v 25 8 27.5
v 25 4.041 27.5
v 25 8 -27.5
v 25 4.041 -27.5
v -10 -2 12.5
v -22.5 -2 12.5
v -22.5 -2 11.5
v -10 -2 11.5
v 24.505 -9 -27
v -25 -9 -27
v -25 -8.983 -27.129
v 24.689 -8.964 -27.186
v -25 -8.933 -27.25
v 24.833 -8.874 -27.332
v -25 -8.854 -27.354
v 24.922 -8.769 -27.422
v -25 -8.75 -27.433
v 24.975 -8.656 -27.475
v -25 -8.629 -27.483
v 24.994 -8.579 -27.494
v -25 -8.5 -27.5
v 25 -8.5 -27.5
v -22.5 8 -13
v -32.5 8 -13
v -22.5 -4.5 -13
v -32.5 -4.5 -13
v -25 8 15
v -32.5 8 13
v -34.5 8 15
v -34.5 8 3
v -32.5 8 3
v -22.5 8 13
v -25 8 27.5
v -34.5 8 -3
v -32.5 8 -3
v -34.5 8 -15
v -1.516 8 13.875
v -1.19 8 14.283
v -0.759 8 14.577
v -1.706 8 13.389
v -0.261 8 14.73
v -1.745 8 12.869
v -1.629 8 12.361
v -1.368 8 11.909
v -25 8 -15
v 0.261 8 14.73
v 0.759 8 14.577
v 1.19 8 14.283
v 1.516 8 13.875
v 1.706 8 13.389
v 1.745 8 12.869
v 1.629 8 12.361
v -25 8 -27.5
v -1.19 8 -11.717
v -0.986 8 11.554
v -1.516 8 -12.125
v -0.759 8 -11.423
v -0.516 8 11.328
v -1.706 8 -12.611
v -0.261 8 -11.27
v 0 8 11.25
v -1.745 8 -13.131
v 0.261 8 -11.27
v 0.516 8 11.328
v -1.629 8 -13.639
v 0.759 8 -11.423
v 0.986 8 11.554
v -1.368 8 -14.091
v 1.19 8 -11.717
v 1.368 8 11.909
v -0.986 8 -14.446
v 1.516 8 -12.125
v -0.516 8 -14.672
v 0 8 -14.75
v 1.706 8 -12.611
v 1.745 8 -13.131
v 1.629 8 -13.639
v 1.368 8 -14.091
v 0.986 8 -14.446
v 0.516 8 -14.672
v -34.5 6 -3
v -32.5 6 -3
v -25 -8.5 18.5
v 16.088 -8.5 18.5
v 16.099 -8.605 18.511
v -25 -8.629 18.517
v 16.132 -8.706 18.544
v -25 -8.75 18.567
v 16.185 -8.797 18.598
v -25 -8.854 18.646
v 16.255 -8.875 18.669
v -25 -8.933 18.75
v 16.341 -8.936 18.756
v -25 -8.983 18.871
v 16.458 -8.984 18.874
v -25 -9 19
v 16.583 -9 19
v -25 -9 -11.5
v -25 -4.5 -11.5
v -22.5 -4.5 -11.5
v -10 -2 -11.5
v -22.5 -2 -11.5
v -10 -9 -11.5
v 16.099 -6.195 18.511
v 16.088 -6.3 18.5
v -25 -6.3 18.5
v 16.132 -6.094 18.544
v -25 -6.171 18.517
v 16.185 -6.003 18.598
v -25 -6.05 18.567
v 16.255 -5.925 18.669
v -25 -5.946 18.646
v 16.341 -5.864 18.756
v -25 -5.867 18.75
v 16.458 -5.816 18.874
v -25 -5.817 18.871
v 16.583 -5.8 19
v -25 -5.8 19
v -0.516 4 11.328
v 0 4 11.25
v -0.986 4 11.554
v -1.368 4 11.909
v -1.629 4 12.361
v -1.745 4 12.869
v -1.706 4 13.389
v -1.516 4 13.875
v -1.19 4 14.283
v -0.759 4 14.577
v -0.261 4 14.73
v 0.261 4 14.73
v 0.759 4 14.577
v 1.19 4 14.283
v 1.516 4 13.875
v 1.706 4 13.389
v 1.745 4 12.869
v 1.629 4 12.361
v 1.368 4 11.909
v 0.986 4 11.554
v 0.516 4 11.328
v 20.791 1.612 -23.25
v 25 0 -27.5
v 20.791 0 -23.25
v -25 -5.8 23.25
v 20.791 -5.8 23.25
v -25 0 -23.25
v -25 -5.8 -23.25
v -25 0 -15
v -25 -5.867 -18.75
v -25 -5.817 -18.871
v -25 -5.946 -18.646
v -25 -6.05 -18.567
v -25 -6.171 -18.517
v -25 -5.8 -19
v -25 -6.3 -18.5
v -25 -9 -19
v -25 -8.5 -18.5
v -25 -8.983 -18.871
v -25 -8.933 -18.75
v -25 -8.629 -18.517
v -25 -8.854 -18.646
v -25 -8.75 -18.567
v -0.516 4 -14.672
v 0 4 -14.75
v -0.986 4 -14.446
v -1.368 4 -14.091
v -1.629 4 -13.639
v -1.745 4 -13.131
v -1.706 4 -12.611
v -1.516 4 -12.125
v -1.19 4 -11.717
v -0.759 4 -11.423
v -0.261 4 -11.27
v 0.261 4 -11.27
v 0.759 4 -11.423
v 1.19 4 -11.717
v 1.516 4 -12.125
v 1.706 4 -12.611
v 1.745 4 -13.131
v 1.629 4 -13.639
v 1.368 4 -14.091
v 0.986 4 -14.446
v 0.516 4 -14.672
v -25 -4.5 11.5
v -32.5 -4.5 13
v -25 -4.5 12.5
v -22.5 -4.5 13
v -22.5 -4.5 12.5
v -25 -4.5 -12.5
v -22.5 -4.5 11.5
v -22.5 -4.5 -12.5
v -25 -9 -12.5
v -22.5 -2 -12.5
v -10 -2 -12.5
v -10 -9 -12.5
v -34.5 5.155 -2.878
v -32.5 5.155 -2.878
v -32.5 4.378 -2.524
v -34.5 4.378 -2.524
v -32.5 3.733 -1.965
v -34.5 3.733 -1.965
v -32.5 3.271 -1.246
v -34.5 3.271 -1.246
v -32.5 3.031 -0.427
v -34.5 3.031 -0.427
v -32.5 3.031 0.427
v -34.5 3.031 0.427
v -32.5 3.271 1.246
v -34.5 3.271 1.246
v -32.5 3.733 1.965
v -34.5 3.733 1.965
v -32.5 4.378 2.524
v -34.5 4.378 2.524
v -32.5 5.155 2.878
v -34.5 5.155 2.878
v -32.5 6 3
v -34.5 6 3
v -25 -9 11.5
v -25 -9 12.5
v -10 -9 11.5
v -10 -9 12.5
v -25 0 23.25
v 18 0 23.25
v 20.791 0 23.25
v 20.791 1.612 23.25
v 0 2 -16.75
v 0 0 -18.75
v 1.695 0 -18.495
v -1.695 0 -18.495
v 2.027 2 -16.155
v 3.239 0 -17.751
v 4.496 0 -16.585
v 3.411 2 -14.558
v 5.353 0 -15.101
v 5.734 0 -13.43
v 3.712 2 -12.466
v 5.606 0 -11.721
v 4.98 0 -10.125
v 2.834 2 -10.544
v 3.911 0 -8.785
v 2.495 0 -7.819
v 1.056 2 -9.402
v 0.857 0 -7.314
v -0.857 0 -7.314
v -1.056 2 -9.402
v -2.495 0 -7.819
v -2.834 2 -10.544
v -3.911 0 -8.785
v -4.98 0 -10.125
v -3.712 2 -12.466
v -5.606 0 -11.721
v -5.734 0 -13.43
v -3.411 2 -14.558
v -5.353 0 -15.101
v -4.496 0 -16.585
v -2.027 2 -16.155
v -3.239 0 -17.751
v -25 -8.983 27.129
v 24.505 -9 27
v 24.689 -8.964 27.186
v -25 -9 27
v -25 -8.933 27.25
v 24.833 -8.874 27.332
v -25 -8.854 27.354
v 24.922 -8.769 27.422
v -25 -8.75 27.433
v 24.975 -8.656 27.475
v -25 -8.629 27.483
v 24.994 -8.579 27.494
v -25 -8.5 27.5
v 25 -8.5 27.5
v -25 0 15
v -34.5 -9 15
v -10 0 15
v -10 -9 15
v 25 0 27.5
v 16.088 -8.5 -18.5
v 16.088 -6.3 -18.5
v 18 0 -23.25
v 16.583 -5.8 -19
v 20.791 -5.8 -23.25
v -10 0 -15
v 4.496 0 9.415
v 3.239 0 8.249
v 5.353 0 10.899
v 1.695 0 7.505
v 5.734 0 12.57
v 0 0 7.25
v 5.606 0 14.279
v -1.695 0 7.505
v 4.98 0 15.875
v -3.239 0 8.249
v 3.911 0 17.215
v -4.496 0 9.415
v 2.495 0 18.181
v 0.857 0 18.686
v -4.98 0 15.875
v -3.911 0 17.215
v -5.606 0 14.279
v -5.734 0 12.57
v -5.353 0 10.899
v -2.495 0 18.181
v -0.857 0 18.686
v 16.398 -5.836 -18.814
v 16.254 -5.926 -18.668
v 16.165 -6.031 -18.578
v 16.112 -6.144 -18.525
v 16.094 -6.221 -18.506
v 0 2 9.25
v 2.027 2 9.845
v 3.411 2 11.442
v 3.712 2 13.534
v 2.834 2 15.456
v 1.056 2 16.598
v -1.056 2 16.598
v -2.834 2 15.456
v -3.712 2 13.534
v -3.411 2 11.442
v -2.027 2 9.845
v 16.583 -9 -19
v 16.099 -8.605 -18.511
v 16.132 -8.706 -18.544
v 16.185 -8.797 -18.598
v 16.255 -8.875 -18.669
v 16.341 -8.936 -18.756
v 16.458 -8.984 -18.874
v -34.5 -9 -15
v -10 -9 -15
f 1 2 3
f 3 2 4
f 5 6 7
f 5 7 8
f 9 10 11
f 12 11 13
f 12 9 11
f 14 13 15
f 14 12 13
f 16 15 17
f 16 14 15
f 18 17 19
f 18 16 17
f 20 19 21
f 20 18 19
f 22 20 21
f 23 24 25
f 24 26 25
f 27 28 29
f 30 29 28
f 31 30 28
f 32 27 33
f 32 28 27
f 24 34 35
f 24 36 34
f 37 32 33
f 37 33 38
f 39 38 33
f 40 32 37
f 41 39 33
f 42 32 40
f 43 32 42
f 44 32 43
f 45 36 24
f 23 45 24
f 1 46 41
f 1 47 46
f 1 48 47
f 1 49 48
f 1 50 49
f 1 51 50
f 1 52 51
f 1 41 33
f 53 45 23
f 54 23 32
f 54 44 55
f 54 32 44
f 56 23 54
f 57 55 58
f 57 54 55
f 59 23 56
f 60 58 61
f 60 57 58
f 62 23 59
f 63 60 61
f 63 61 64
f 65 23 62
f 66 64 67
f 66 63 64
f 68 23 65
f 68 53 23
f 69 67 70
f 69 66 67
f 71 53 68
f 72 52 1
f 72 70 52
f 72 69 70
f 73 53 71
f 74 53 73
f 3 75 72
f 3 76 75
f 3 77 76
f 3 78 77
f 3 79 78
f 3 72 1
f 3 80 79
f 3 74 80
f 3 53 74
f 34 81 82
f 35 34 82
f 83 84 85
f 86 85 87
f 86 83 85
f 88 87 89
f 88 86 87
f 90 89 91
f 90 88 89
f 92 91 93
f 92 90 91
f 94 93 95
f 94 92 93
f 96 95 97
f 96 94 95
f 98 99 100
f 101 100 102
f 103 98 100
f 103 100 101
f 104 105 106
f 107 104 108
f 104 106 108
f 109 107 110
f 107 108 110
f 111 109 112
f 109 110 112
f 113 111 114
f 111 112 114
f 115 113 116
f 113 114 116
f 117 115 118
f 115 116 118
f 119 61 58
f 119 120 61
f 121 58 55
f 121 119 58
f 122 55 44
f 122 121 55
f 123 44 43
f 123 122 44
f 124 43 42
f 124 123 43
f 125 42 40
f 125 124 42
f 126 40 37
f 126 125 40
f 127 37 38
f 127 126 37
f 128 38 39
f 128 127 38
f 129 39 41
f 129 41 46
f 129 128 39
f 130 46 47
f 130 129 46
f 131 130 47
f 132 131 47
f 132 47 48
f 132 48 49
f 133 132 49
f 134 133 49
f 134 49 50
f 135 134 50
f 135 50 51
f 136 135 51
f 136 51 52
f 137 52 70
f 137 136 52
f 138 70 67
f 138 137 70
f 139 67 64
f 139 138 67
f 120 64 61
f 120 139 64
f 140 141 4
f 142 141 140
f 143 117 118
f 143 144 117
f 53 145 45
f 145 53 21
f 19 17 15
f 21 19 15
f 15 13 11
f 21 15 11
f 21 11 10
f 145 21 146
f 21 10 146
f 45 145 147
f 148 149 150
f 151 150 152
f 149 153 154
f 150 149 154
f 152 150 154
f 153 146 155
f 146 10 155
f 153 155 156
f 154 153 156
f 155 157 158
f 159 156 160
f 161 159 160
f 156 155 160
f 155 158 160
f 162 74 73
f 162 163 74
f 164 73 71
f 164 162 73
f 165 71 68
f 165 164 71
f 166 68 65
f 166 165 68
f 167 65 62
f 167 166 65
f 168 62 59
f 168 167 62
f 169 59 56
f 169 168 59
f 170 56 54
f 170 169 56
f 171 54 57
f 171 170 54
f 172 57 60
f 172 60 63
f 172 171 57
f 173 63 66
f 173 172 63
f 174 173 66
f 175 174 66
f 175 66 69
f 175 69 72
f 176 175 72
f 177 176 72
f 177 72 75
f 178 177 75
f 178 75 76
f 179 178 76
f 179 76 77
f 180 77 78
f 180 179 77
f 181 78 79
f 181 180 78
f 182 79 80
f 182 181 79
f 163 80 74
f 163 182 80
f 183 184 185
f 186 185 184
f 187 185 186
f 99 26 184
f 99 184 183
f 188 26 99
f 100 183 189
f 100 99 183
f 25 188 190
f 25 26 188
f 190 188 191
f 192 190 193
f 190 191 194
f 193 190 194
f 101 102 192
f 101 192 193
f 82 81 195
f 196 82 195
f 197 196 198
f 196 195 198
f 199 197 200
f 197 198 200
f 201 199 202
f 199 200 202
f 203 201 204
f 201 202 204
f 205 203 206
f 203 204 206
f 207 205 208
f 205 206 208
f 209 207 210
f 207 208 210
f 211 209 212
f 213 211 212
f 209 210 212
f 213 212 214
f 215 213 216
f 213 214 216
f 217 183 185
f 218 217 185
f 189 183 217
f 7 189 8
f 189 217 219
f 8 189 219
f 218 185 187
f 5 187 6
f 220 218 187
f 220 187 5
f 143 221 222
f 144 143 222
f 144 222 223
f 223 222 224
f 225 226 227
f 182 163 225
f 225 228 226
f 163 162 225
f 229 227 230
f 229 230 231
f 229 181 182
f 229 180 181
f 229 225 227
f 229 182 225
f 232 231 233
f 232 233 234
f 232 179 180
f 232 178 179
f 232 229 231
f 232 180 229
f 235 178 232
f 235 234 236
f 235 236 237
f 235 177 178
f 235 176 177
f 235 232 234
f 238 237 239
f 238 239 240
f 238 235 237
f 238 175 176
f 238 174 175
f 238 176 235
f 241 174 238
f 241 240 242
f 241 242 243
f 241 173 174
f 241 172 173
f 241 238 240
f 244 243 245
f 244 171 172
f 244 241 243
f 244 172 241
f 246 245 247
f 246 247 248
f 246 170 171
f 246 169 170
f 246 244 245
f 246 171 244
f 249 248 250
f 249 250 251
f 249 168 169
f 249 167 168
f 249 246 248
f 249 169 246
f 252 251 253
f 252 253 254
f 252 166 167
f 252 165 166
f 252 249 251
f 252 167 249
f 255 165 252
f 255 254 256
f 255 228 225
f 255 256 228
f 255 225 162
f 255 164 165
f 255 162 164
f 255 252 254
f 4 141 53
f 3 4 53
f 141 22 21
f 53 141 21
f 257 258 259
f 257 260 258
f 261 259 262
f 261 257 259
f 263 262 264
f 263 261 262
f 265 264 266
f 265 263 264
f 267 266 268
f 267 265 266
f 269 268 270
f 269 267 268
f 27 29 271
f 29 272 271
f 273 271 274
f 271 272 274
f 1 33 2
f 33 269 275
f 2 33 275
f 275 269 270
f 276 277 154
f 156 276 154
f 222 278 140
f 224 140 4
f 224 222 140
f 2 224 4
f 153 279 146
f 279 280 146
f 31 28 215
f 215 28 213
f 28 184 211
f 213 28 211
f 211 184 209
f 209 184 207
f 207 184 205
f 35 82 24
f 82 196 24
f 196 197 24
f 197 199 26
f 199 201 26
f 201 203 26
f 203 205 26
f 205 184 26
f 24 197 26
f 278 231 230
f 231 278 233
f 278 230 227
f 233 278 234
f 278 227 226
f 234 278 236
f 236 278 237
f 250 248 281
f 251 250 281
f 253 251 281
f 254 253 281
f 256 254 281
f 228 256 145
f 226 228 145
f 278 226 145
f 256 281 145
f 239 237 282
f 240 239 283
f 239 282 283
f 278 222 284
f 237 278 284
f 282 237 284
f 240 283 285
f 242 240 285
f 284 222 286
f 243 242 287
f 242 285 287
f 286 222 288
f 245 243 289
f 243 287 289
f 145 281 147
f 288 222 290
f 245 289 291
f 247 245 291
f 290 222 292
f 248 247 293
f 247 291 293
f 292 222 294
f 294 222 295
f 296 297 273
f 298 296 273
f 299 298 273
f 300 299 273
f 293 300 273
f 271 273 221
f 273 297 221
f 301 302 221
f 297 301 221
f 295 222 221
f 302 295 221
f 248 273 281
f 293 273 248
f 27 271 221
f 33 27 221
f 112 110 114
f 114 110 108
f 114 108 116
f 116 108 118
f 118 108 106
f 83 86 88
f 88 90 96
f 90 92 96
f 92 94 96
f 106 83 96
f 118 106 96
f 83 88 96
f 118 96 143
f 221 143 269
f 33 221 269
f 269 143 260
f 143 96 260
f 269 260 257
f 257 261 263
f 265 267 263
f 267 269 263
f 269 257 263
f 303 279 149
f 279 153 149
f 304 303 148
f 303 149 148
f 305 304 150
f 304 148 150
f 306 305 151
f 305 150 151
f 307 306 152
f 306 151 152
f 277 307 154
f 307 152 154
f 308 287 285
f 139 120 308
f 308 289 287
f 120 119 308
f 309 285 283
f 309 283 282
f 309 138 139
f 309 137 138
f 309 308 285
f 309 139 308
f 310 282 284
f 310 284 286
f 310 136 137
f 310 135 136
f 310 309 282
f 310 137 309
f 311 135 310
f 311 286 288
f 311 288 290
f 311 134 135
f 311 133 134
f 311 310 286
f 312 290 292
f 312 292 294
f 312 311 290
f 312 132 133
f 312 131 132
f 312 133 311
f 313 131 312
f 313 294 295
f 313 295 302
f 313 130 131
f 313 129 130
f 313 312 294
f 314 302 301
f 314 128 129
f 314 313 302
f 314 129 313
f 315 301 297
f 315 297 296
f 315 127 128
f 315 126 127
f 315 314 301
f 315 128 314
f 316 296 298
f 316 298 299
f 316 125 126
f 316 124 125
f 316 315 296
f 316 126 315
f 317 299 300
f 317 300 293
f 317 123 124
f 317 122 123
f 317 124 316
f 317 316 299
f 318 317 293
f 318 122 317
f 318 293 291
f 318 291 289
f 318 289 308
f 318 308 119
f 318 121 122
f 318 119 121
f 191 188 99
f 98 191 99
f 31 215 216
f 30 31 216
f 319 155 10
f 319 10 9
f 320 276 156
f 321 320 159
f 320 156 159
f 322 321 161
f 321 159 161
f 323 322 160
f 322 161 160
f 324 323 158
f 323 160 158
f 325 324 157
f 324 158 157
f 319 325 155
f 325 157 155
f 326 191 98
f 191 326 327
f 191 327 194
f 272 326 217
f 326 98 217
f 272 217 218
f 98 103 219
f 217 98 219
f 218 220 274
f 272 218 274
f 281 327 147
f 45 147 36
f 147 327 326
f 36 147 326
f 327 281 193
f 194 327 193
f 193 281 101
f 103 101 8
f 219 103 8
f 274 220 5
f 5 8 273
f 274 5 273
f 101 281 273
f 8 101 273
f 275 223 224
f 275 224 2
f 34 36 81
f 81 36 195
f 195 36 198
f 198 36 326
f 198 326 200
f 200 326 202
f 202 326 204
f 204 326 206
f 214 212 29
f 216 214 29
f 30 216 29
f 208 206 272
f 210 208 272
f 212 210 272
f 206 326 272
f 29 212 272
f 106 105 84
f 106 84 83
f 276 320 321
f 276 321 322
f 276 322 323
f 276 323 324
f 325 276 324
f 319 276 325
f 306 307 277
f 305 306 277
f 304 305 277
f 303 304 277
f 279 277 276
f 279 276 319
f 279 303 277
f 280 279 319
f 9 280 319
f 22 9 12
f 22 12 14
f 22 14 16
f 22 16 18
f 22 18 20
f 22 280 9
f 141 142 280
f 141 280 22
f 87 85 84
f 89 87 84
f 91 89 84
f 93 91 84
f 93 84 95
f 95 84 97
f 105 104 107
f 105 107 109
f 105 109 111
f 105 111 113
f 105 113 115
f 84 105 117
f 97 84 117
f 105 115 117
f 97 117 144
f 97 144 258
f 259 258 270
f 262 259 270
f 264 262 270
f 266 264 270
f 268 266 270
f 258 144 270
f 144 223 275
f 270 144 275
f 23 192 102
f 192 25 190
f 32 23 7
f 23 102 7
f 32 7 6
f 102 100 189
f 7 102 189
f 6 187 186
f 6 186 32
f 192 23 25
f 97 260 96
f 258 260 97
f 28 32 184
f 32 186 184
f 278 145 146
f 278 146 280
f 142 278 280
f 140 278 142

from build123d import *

# Parameters (mm, degrees)
SKETCH_1_W          = 50
SKETCH_1_H          = 55
EXTRUDE_1_DEPTH     = 6
SKETCH_2_W          = 15
SKETCH_2_H          = 30
EXTRUDE_2_DEPTH     = 9
SKETCH_3_W          = 15
SKETCH_3_H          = 1
CUT_EXTRUDE_1_DEPTH = 7
SKETCH_4_W          = 50
SKETCH_4_H          = 4.25
EXTRUDE_3_DEPTH     = 9.5
SKETCH_5_W          = 50
SKETCH_5_H          = 3.7
EXTRUDE_4_DEPTH     = 4.75
CUT_EXTRUDE_2_DEPTH = 9.5
SKETCH_7_W          = 30
SKETCH_7_H          = 15
EXTRUDE_5_DEPTH     = 9.5
SKETCH_8_W          = 10
SKETCH_8_H          = 26
CUT_EXTRUDE_3_DEPTH = 10.5
SKETCH_9_R          = 3
CUT_EXTRUDE_4_DEPTH = 7.5
SKETCH_10_R         = 1.75
CUT_EXTRUDE_5_DEPTH = 7.5
CHAMFER_1_SIZE      = 4
SKETCH_11_R         = 1.75
EXTRUDE_6_DEPTH     = 2
SKETCH_12_W         = 89.739519214
SKETCH_12_H         = 69.095216672
CUT_EXTRUDE_6_DEPTH = 0.5
CHAMFER_2_SIZE      = 7
CHAMFER_2_SIZE_2    = 4.041451884
FILLET_1_R          = 0.5


with BuildPart() as part:
    # Эскиз1 → Бобышка-Вытянуть1 (new body)
    with BuildSketch(Plane(origin=(0, 0, 0), x_dir=(1, 0, 0), z_dir=(0, 1, 0))):
        Rectangle(SKETCH_1_W, SKETCH_1_H)
    extrude(amount=EXTRUDE_1_DEPTH)

    # Эскиз2 → Бобышка-Вытянуть2 (add)
    with BuildSketch(Plane.XZ):
        with Locations((-17.5, 0)):
            Rectangle(SKETCH_2_W, SKETCH_2_H)
    extrude(amount=EXTRUDE_2_DEPTH)

    # Эскиз3 → Вырез-Вытянуть1 (cut)
    with BuildSketch(Plane.XZ.offset(9)):
        with Locations((-17.5, 12)):
            Rectangle(SKETCH_3_W, SKETCH_3_H)
        with Locations((-17.5, -12)):
            Rectangle(SKETCH_3_W, SKETCH_3_H)
    extrude(amount=-CUT_EXTRUDE_1_DEPTH, mode=Mode.SUBTRACT)

    # Эскиз4 → Бобышка-Вытянуть3 (add)
    with BuildSketch(Plane.XZ):
        with Locations((0, -25.375)):
            Rectangle(SKETCH_4_W, SKETCH_4_H)
        with Locations((0, 25.375)):
            Rectangle(SKETCH_4_W, SKETCH_4_H)
    extrude(amount=EXTRUDE_3_DEPTH)

    # Эскиз5 → Бобышка-Вытянуть4 (add)
    with BuildSketch(Plane(origin=(0, 0, 23.25), x_dir=(-1, 0, 0), z_dir=(0, 0, -1))):
        with Locations((0, -7.65)):
            Rectangle(SKETCH_5_W, SKETCH_5_H)
    extrude_4 = extrude(amount=EXTRUDE_4_DEPTH)

    # Зеркальное отражение1: Бобышка-Вытянуть4 across plane
    add(extrude_4.mirror(Plane.XY))

    # Эскиз6 → Вырез-Вытянуть2 (cut)
    with BuildSketch(Plane.XZ):
        Polygon((16.087749561, -18.5), (25, -27.5), (25, -18.5), align=None)
        Polygon((25, 18.5), (16.087749561, 18.5), (25, 27.5), align=None)
    extrude(amount=CUT_EXTRUDE_2_DEPTH, mode=Mode.SUBTRACT)

    # Эскиз7 → Бобышка-Вытянуть5 (add)
    with BuildSketch(Plane.ZY.offset(25)):
        with Locations((0, -1.5)):
            Rectangle(SKETCH_7_W, SKETCH_7_H)
    extrude(amount=EXTRUDE_5_DEPTH)

    # Эскиз8 → Вырез-Вытянуть3 (cut)
    with BuildSketch(Plane(origin=(0, 6, 0), x_dir=(1, 0, 0), z_dir=(0, 1, 0))):
        with Locations((-27.5, 0)):
            Rectangle(SKETCH_8_W, SKETCH_8_H)
    extrude(amount=-CUT_EXTRUDE_3_DEPTH, mode=Mode.SUBTRACT)

    # Эскиз9 → Вырез-Вытянуть4 (cut)
    with BuildSketch(Plane.ZY.offset(34.5)):
        with Locations((0, 6)):
            Circle(SKETCH_9_R)
    extrude(amount=-CUT_EXTRUDE_4_DEPTH, mode=Mode.SUBTRACT)

    # Эскиз10 → Вырез-Вытянуть5 (cut)
    with BuildSketch(Plane.XZ):
        with Locations(Location((0, 13, 0), (0, 0, 270))):
            Circle(SKETCH_10_R)
        with Locations(Location((0, -13, 0), (0, 0, 270))):
            Circle(SKETCH_10_R)
    extrude(amount=-CUT_EXTRUDE_5_DEPTH, mode=Mode.SUBTRACT)

    # Фаска1
    chamfer_1_edges = [part.edges().sort_by_distance(p)[0] for p in [
        (0, 0, 14.75),
        (0, 0, -11.25),
    ]]
    chamfer(chamfer_1_edges, length=CHAMFER_1_SIZE)

    # Эскиз11 → Бобышка-Вытянуть6 (add)
    with BuildSketch(Plane(origin=(0, 6, 0), x_dir=(1, 0, 0), z_dir=(0, 1, 0))):
        Polygon((-34.5, 3), (-32.5, 3), (-32.5, 13), (-22.5, 13), (-22.5, -13), (-32.5, -13), (-32.5, -3), (-34.5, -3), (-34.5, -15), (-25, -15), (-25, -27.5), (25, -27.5), (25, 27.5), (-25, 27.5), (-25, 15), (-34.5, 15), align=None)
        with Locations(Location((0, 13, 0), (0, 0, 90))):
            Circle(SKETCH_11_R, mode=Mode.SUBTRACT)
        with Locations(Location((0, -13, 0), (0, 0, 90))):
            Circle(SKETCH_11_R, mode=Mode.SUBTRACT)
    extrude(amount=EXTRUDE_6_DEPTH)

    # Эскиз12 → Вырез-Вытянуть6 (cut)
    with BuildSketch(Plane.XZ.offset(9.5)):
        with Locations((1.274872697, 1.26393689)):
            Rectangle(SKETCH_12_W, SKETCH_12_H)
    extrude(amount=-CUT_EXTRUDE_6_DEPTH, mode=Mode.SUBTRACT)

    # Фаска2
    # the kernel refuses this chamfer: 7, 4.041451884 mm, written as the material it takes off along each edge
    with BuildSketch(Plane(origin=(25, 0, 45.609600283), x_dir=(-0.9998132206222079, -0.019326765612700747, 0), z_dir=(0, 0, -1))) as chamfer_2_piece_1_section:
        Polygon((CHAMFER_2_SIZE * 0.999813220622, CHAMFER_2_SIZE * 0.0193267656127), (-CHAMFER_2_SIZE_2 * 0.0193267656143, CHAMFER_2_SIZE_2 * 0.999813220703), (0, 0), align=None)
    chamfer_2_piece_1 = extrude(amount=91.219200565, mode=Mode.PRIVATE)
    chamfer_2_piece_1 = split(chamfer_2_piece_1, bisect_by=Plane(origin=(23.020268738, 1.666507019, 25.500776405), z_dir=(0.7105622702047159, 0, -0.7036343227568711)), keep=Keep.TOP, mode=Mode.PRIVATE)
    chamfer_2_piece_1 = split(chamfer_2_piece_1, bisect_by=Plane(origin=(23.772949655, 1.666507019, -23.25), z_dir=(0, 0, 1)), keep=Keep.TOP, mode=Mode.PRIVATE)
    add(chamfer_2_piece_1, mode=Mode.SUBTRACT)
    with BuildSketch(Plane(origin=(25, 0, 45.609600283), x_dir=(-0.9998132206222079, -0.019326765612700747, 0), z_dir=(0, 0, -1))) as chamfer_2_piece_2_section:
        Polygon((CHAMFER_2_SIZE * 0.999813220622, CHAMFER_2_SIZE * 0.0193267656127), (-CHAMFER_2_SIZE_2 * 0.0193267656143, CHAMFER_2_SIZE_2 * 0.999813220703), (0, 0), align=None)
    chamfer_2_piece_2 = extrude(amount=91.219200565, mode=Mode.PRIVATE)
    chamfer_2_piece_2 = split(chamfer_2_piece_2, bisect_by=Plane(origin=(-2.796120558, 0.402909268, 0.569799735), z_dir=(0.7105622702047159, 0, 0.7036343227568711)), keep=Keep.TOP, mode=Mode.PRIVATE)
    chamfer_2_piece_2 = split(chamfer_2_piece_2, bisect_by=Plane(origin=(19.395718646, 0.402909268, 23.25), z_dir=(0, 0, -1)), keep=Keep.TOP, mode=Mode.PRIVATE)
    add(chamfer_2_piece_2, mode=Mode.SUBTRACT)

    # Скругление1
    fillet_1_edges = [part.edges().sort_by_distance(p)[0] for p in [
        (0, -9, 27.5),
        (-4.45612522, -9, 18.5),
        (-4.45612522, -9, -18.5),
        (0, -9, -27.5),
        (-4.45612522, -5.8, 18.5),
        (-4.45612522, -5.8, -18.5),
    ]]
    fillet(fillet_1_edges, radius=FILLET_1_R)


solid = part.part
